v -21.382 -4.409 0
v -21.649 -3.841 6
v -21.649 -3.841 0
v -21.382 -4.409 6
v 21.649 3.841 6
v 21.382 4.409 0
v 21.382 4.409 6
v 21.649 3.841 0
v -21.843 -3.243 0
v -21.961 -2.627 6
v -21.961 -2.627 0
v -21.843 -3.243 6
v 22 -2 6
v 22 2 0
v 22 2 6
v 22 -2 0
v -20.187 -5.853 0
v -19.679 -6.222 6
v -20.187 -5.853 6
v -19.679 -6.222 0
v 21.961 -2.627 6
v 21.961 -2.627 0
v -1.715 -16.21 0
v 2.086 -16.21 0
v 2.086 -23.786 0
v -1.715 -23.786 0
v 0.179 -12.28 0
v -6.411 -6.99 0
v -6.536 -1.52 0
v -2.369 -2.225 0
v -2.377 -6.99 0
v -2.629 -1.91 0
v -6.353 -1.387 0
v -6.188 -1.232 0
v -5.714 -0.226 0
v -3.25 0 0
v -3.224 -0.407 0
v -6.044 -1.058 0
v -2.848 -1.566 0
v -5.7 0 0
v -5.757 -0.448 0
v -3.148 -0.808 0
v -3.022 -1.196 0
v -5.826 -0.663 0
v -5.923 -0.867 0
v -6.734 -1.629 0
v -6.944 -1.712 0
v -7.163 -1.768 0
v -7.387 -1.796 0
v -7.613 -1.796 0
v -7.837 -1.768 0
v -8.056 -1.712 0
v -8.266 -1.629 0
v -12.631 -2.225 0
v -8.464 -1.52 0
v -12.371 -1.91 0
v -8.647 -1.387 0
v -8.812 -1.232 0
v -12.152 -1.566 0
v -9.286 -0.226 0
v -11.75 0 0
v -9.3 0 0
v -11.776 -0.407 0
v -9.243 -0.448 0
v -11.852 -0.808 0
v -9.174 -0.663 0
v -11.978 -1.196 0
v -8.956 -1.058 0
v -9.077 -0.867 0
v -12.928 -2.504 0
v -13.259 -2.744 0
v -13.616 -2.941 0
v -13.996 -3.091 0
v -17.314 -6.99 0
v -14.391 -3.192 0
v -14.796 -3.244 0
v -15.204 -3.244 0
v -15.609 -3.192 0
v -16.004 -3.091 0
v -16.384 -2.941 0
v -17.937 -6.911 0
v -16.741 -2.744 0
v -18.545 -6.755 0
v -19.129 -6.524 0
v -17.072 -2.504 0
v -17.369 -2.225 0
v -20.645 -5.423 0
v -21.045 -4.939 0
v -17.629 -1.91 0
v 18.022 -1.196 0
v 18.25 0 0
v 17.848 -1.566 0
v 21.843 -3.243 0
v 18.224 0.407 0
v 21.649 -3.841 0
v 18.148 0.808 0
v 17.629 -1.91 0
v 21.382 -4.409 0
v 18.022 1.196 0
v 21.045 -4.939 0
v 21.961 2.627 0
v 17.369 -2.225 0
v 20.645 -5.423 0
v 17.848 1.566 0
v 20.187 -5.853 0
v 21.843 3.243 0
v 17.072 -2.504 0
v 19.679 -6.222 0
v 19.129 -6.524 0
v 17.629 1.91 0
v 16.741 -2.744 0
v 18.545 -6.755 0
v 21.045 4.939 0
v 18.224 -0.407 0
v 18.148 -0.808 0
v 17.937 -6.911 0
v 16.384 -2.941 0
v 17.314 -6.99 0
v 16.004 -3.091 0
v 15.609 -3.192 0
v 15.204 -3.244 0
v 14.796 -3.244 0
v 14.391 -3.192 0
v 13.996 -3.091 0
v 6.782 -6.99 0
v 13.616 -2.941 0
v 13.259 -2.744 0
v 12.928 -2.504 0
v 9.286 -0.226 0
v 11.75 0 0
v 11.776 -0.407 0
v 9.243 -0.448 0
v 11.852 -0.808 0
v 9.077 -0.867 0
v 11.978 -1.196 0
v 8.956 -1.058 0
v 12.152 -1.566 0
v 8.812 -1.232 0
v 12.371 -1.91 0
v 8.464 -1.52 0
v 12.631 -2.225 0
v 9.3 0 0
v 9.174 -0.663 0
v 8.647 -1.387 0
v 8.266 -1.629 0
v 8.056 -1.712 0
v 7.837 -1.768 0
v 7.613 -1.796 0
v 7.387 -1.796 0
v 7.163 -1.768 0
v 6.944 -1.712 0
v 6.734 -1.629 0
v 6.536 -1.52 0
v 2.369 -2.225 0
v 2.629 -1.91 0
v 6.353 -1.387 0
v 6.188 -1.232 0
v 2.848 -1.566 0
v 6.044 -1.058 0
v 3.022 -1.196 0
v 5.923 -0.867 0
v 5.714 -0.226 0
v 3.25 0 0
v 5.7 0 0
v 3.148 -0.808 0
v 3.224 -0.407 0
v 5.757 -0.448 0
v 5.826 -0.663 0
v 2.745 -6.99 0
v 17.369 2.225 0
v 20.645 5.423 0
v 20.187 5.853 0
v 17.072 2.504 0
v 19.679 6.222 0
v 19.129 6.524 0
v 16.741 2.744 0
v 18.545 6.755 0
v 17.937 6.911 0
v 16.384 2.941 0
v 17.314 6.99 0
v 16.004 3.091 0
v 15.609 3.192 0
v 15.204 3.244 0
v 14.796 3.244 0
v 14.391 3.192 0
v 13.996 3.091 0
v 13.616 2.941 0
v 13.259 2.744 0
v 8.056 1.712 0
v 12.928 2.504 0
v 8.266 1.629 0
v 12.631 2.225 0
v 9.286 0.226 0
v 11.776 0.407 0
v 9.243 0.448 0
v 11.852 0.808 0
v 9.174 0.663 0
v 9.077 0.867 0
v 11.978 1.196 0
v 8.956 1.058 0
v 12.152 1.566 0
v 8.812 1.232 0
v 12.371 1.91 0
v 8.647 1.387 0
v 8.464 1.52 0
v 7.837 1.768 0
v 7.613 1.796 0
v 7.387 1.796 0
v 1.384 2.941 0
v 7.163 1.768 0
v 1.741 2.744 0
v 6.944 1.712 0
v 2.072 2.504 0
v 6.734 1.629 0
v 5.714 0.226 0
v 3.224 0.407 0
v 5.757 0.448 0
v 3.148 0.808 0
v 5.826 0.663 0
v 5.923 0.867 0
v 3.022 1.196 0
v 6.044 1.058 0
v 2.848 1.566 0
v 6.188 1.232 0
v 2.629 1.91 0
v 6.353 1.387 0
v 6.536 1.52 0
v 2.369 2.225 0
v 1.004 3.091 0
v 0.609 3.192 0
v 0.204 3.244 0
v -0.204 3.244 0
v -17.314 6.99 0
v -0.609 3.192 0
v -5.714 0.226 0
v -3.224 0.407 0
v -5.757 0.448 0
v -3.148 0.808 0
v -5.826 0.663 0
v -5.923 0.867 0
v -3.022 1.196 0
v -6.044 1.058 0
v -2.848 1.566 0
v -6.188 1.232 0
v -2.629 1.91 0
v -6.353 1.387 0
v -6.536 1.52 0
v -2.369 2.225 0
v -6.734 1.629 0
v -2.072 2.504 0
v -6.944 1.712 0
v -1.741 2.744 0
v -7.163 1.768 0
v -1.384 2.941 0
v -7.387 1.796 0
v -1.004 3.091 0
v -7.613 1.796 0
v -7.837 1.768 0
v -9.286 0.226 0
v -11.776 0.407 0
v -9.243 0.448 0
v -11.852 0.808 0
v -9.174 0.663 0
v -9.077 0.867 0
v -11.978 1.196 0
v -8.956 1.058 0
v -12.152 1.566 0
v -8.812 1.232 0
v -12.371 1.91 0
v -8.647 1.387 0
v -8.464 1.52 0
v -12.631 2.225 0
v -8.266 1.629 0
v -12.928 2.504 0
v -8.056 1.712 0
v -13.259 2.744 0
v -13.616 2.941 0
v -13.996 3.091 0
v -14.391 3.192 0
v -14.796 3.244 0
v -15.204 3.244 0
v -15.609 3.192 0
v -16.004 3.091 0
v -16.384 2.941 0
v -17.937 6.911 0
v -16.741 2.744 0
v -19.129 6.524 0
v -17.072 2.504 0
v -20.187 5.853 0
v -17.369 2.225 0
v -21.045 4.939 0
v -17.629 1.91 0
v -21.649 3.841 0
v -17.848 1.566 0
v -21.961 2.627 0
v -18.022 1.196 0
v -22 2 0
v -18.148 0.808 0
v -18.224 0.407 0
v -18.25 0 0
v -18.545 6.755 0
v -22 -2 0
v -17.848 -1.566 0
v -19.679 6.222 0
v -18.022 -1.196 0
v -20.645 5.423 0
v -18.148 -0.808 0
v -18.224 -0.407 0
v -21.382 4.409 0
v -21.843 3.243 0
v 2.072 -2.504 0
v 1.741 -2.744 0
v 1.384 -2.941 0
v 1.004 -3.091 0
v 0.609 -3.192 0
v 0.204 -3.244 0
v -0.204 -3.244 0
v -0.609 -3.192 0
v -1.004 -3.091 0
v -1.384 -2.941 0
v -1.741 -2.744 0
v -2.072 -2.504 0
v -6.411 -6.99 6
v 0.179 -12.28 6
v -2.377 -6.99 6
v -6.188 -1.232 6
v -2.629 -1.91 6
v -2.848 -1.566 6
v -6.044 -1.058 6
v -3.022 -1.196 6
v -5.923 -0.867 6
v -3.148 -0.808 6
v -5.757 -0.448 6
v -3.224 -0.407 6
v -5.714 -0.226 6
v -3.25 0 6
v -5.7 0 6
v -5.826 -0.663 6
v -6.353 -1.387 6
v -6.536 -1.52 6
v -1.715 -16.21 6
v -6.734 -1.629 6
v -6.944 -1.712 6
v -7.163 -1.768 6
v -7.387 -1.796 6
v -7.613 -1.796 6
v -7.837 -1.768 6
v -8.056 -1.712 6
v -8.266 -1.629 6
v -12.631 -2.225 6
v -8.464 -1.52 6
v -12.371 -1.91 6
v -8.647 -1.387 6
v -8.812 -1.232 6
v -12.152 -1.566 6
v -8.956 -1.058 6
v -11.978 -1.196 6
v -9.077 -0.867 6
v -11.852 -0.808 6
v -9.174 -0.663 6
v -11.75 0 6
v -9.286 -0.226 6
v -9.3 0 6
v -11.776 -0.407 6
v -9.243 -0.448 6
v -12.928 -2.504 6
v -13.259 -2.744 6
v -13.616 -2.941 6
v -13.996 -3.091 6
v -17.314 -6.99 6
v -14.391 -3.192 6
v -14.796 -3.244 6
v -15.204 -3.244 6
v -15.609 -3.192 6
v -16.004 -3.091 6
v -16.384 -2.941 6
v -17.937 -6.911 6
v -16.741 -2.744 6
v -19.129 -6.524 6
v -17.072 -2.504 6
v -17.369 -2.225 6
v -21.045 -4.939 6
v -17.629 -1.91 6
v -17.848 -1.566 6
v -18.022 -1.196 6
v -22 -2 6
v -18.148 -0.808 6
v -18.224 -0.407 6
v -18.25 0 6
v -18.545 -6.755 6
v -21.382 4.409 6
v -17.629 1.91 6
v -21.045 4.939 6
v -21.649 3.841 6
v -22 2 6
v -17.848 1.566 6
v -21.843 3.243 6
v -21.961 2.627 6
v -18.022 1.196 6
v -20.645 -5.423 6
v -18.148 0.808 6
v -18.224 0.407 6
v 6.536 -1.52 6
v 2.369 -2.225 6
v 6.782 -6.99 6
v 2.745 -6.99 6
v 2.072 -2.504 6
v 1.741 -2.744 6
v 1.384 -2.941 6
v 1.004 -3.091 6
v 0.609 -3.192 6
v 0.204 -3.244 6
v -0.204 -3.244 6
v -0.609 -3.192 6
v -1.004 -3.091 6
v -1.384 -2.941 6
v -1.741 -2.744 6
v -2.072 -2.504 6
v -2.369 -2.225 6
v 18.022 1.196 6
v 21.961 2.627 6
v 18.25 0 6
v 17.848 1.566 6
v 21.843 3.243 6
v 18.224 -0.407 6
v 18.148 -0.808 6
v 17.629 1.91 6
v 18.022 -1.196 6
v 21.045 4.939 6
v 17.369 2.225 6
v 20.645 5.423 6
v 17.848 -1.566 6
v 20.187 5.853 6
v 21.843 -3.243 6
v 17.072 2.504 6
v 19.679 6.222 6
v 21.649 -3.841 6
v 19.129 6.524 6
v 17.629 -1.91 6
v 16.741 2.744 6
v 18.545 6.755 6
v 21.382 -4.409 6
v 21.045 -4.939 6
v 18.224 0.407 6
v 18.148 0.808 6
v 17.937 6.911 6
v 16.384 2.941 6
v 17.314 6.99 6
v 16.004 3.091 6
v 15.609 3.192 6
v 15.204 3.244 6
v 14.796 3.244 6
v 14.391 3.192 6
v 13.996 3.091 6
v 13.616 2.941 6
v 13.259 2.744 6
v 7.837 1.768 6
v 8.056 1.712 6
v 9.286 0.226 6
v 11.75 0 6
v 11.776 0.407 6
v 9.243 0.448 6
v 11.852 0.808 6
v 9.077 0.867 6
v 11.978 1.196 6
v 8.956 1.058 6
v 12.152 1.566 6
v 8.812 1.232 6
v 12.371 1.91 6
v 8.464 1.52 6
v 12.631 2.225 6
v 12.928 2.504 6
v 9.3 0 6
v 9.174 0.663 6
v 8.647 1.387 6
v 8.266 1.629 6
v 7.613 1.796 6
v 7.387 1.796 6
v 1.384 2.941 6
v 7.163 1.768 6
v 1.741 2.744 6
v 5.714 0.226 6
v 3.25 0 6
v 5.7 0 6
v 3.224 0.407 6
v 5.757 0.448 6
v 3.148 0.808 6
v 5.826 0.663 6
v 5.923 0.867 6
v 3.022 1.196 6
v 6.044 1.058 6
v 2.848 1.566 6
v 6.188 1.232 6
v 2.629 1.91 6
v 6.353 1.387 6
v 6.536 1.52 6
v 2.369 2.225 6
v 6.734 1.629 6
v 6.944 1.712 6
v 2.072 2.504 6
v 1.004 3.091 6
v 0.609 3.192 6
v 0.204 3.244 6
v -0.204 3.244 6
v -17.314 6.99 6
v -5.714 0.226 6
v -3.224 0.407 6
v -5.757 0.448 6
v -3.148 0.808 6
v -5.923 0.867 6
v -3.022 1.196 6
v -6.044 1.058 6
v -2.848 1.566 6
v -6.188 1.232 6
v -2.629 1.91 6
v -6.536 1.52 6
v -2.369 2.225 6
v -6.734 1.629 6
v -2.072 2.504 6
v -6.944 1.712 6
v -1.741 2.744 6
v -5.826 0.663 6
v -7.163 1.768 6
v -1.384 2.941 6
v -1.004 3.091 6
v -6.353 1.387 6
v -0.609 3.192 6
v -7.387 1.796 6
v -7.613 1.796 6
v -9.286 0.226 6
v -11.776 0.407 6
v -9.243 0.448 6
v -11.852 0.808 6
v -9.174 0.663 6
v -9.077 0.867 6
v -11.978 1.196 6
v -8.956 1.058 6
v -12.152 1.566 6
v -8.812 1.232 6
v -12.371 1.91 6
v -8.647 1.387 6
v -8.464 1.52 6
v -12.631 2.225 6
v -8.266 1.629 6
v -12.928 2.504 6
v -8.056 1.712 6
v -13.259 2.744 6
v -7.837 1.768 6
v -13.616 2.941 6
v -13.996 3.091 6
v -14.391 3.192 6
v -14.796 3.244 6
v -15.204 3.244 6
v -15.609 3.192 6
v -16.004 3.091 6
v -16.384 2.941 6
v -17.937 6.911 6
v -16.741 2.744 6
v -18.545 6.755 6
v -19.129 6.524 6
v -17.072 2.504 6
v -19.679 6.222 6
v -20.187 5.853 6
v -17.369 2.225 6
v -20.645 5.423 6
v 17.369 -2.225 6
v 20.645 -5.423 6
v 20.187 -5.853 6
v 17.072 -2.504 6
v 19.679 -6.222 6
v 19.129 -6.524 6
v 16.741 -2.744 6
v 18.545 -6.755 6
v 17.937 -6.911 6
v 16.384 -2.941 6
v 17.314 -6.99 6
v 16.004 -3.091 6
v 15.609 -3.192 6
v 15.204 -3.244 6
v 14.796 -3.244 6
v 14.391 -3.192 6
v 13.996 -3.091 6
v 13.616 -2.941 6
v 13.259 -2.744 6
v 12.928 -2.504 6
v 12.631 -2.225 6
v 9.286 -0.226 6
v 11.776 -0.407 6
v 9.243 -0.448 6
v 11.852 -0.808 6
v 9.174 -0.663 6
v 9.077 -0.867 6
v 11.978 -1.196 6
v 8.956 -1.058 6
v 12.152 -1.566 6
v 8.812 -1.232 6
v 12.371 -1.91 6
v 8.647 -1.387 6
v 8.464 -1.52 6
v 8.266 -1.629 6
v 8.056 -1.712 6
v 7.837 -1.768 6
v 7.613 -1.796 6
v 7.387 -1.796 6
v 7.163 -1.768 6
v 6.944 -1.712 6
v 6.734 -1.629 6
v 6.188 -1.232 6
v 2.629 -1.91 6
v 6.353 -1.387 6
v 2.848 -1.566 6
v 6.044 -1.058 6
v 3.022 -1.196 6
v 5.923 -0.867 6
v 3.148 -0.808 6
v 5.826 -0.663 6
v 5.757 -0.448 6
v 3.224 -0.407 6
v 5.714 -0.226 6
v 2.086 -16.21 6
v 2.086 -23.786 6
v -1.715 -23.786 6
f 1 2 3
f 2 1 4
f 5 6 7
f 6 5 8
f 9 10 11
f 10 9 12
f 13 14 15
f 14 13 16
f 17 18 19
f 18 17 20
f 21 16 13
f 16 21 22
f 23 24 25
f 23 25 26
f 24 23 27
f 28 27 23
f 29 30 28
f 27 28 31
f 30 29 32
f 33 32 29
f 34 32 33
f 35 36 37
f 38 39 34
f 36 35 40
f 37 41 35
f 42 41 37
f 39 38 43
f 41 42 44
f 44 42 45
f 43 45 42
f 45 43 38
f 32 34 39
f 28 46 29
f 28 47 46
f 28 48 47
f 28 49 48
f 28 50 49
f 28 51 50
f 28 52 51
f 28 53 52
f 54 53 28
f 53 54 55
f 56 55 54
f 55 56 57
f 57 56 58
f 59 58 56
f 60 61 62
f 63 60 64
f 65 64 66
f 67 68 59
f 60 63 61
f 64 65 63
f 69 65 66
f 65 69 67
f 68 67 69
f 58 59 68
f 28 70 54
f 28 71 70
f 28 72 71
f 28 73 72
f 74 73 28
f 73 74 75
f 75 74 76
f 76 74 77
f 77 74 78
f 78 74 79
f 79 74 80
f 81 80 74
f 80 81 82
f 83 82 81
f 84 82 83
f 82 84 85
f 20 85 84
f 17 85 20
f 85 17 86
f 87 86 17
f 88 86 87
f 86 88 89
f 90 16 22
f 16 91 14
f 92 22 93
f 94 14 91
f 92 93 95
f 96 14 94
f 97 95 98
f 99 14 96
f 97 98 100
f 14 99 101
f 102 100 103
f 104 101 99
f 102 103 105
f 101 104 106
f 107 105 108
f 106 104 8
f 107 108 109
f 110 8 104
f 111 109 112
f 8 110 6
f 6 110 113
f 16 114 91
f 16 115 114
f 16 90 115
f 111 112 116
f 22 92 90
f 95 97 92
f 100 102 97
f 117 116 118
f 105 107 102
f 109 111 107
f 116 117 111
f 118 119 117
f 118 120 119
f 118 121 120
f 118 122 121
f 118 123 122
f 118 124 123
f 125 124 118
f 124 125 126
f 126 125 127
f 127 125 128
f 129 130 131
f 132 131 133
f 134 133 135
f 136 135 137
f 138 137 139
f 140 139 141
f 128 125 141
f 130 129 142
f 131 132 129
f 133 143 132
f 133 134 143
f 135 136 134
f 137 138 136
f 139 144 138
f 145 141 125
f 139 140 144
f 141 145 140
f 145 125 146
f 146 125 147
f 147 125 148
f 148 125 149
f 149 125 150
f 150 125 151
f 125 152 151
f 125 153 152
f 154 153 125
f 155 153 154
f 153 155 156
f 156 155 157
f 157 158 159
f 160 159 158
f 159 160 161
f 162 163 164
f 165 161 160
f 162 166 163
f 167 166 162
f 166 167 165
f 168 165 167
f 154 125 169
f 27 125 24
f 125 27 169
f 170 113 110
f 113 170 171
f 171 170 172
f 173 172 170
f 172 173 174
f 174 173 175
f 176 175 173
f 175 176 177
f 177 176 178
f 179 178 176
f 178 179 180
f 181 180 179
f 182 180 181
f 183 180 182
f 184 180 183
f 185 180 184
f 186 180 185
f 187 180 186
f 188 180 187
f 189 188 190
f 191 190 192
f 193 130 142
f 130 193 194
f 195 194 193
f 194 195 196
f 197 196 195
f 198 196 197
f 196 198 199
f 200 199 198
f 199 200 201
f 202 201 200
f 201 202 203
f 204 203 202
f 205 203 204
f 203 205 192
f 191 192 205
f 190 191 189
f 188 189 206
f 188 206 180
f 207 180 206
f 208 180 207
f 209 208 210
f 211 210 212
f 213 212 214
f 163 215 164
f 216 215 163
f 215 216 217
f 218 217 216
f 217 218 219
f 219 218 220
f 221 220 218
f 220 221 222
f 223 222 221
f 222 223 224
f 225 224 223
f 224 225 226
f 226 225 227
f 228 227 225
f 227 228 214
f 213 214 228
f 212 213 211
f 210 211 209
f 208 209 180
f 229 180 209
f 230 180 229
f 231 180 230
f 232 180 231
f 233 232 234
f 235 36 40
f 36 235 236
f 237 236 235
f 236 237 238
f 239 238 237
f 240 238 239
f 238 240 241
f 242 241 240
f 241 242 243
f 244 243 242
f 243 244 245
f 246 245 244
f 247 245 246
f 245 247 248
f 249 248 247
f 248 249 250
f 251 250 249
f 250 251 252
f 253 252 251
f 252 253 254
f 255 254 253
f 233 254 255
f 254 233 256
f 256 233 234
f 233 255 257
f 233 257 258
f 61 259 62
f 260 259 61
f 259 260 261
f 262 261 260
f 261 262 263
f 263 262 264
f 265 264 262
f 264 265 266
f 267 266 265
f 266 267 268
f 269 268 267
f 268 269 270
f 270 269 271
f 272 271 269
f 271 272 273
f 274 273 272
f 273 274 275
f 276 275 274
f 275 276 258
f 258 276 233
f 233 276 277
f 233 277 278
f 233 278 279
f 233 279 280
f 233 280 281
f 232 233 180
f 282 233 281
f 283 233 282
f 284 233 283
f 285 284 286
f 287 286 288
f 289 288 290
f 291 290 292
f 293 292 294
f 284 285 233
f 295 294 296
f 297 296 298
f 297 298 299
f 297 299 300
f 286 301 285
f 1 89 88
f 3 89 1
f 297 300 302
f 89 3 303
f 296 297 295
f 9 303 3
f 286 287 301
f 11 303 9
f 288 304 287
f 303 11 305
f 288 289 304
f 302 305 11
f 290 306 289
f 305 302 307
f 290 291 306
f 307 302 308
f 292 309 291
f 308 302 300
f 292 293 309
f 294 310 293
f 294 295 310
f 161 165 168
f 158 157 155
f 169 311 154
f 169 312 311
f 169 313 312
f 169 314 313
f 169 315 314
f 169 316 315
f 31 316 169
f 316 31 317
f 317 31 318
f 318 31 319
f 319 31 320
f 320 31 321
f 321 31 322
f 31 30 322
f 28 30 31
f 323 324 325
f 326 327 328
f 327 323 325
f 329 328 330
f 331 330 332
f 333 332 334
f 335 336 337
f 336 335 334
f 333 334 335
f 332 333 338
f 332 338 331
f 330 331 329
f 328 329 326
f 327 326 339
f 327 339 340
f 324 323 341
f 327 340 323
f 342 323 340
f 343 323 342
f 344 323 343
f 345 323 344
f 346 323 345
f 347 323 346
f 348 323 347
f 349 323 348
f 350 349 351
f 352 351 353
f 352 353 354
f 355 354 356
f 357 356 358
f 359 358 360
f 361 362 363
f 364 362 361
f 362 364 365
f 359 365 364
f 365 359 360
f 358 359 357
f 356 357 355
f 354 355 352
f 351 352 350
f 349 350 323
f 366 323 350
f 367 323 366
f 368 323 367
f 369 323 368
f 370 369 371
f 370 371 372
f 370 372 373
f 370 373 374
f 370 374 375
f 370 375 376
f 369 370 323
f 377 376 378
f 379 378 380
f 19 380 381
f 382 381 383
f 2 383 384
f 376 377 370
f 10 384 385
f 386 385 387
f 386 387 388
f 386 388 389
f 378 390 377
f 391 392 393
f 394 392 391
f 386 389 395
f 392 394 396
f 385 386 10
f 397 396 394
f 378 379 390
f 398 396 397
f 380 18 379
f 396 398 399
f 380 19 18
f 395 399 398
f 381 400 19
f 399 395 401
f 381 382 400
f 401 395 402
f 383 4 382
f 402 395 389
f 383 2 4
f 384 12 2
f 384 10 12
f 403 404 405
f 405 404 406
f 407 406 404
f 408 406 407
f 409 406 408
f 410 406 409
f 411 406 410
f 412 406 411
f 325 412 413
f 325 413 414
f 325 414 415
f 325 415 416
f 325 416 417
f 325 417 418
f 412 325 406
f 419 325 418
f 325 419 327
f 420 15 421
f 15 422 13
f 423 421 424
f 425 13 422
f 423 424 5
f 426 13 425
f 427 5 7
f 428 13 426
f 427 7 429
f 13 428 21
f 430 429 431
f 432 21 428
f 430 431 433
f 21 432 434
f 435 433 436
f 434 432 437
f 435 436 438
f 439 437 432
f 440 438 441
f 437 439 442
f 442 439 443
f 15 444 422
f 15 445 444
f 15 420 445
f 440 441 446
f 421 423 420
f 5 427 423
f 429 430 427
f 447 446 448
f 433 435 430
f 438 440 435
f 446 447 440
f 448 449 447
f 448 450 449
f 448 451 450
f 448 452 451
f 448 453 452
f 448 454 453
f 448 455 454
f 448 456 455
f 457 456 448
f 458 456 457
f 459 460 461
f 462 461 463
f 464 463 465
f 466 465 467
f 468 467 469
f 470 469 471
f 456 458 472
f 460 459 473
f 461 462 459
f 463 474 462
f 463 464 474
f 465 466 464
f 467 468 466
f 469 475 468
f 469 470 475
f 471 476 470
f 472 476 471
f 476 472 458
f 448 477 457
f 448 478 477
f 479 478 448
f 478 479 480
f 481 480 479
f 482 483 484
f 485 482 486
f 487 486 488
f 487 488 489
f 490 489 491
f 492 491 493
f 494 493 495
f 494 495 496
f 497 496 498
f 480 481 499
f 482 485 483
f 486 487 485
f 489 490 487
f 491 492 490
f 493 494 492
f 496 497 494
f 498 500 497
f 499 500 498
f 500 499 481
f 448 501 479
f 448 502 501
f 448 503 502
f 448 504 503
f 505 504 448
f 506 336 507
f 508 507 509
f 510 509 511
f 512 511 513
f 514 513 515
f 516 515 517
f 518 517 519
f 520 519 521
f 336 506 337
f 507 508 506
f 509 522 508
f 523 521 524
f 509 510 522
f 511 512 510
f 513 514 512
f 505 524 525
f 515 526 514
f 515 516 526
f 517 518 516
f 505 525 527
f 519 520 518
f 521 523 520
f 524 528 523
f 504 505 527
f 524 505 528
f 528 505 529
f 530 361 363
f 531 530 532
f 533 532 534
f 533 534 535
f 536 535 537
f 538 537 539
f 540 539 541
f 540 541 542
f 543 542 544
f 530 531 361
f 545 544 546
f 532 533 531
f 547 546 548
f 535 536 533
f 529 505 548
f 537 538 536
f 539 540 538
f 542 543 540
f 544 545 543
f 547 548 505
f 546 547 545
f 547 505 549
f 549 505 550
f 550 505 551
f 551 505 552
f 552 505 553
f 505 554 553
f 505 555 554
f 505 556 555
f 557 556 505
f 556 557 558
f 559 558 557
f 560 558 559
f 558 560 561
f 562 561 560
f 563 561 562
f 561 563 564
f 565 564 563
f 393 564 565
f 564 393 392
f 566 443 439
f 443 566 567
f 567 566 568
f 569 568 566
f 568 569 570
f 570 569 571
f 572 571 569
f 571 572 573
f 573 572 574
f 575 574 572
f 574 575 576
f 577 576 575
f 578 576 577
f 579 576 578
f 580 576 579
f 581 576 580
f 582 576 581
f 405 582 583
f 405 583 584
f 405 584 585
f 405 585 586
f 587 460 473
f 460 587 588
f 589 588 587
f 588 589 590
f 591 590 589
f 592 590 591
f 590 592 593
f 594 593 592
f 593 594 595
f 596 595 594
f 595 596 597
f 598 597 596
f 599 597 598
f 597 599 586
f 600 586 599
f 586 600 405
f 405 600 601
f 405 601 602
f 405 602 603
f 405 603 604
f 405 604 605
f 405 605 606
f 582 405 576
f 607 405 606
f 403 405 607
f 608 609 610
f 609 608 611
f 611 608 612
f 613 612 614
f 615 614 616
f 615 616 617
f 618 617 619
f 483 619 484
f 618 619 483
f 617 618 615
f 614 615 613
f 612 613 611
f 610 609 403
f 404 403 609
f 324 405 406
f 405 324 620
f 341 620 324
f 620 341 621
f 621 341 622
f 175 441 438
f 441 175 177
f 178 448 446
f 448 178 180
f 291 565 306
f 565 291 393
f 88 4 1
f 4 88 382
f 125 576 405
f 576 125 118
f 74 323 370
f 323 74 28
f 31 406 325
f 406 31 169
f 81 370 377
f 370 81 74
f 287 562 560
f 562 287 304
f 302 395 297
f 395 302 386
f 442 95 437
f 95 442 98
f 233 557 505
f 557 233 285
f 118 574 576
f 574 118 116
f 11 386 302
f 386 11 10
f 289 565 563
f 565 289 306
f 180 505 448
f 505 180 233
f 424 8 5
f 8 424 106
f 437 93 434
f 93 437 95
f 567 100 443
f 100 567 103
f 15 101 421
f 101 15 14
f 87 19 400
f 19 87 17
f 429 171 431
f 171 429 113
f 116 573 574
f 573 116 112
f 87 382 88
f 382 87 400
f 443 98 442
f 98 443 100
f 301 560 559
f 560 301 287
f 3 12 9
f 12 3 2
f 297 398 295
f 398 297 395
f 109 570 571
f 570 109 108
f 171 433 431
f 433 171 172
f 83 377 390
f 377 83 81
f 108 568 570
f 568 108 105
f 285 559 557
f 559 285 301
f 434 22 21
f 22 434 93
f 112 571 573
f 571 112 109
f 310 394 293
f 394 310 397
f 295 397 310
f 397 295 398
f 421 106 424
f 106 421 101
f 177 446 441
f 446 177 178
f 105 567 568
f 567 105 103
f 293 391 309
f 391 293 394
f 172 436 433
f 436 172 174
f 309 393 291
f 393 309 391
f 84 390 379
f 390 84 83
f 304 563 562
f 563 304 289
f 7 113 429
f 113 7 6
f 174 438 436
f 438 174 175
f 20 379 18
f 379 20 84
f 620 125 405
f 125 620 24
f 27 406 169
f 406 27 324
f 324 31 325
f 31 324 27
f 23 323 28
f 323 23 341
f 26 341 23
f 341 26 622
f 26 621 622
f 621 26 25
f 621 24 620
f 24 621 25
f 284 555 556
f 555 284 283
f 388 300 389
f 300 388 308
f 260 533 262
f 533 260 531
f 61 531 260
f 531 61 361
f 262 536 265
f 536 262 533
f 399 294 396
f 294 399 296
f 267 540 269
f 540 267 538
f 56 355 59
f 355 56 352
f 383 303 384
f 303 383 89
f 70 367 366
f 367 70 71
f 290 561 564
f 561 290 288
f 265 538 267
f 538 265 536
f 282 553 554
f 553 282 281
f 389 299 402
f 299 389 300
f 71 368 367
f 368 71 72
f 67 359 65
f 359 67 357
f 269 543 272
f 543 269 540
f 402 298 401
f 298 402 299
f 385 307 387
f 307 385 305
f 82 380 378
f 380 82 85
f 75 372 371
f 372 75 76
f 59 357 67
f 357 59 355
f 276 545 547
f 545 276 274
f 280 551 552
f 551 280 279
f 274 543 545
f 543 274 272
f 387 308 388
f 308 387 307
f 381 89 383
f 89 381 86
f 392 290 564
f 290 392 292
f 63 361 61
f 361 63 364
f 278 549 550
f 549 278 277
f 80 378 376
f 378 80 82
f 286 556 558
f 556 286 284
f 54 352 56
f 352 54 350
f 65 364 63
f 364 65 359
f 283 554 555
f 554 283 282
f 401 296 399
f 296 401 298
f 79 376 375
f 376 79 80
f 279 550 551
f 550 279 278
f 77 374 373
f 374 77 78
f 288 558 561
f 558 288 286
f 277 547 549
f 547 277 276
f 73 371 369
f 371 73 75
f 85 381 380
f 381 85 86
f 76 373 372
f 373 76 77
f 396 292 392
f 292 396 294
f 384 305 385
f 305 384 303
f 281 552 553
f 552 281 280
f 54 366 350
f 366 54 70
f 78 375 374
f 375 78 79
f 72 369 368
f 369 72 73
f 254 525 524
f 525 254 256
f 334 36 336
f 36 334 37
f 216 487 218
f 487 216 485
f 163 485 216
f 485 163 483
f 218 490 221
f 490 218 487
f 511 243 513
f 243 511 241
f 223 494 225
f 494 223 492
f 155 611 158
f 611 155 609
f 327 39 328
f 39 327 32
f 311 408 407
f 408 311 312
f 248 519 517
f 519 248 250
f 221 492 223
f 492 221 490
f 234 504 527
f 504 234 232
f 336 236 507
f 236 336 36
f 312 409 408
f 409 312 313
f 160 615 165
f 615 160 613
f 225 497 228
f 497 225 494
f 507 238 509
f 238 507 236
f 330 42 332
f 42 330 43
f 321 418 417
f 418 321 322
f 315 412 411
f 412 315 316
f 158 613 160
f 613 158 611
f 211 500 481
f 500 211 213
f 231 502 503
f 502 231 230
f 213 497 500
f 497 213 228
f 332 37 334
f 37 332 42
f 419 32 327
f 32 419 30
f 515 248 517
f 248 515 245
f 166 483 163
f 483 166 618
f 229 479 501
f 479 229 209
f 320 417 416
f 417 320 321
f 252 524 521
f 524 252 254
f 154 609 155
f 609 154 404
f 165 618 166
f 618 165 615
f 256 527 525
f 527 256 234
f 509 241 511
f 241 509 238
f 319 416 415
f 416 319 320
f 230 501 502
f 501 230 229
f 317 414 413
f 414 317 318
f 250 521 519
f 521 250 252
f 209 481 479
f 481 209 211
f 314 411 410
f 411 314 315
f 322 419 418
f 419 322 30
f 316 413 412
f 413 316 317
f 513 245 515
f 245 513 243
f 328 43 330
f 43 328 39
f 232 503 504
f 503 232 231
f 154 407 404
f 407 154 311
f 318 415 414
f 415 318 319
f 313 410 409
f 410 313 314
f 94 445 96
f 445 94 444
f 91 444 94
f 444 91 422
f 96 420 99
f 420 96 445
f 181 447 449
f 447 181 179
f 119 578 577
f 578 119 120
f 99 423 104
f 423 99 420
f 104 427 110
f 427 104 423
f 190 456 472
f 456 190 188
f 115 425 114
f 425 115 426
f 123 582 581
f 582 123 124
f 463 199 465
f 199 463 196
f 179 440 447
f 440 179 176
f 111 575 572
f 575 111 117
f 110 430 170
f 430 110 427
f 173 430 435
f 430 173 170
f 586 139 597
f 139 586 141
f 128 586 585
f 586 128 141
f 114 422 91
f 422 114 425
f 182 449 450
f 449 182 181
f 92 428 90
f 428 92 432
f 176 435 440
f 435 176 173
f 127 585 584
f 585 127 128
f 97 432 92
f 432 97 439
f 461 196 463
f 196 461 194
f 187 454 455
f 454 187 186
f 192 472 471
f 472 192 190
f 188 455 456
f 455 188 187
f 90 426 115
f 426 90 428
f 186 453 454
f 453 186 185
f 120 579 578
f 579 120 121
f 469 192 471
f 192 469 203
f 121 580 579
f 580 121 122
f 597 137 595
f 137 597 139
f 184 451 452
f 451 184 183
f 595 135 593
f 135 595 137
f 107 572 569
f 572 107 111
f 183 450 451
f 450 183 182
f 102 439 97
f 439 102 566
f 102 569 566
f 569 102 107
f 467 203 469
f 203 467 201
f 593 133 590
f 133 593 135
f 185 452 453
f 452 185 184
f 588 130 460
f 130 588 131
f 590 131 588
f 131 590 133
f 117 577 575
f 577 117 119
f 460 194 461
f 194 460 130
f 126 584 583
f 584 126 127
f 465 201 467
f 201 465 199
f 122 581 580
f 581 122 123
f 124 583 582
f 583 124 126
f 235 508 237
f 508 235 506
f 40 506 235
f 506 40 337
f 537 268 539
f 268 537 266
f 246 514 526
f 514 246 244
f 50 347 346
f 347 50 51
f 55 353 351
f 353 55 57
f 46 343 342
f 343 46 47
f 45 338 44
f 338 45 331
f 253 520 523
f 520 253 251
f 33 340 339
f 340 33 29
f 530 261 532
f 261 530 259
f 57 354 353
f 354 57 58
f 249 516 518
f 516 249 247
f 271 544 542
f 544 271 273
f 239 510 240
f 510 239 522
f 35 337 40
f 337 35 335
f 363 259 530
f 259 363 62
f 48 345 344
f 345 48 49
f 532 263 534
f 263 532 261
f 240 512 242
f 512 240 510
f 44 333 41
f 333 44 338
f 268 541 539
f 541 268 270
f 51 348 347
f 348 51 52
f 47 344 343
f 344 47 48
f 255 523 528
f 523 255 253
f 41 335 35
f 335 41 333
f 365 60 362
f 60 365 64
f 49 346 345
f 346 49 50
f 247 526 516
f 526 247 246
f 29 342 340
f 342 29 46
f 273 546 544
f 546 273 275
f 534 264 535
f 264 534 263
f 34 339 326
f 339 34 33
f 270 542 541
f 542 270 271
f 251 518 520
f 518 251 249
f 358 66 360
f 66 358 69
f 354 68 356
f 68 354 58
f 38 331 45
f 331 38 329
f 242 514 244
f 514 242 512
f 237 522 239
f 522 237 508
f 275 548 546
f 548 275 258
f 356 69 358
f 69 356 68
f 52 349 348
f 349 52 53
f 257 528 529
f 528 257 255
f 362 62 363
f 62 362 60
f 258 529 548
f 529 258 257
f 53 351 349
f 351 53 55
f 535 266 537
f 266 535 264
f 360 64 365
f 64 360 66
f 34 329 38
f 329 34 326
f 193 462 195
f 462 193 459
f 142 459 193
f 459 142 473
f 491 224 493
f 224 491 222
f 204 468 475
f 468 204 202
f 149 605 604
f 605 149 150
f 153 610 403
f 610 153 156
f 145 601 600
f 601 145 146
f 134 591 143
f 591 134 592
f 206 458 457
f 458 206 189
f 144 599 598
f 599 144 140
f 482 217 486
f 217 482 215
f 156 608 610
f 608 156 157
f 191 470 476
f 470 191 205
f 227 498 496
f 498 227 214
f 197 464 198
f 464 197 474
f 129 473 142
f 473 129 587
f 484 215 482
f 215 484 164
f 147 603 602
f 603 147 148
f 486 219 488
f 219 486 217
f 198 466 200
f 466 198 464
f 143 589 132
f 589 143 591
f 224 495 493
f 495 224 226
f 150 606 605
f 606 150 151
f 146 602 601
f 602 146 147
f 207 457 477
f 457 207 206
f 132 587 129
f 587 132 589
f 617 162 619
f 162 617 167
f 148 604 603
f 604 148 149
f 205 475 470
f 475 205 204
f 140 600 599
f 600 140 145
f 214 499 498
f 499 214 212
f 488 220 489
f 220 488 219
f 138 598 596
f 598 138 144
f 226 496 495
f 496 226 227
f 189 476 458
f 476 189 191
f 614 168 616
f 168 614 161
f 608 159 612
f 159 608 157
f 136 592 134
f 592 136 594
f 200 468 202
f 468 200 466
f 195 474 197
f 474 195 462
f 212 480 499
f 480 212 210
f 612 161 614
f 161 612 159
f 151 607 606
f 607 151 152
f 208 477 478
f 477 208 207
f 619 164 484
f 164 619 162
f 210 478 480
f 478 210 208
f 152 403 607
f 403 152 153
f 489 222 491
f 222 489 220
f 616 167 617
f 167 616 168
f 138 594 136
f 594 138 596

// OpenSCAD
$fn = 50;


difference() {
	union() {
		hull() {
			translate(v = [-17.0000000000, 2.0000000000, 0]) {
				cylinder(h = 6, r = 5);
			}
			translate(v = [17.0000000000, 2.0000000000, 0]) {
				cylinder(h = 6, r = 5);
			}
			translate(v = [-17.0000000000, -2.0000000000, 0]) {
				cylinder(h = 6, r = 5);
			}
			translate(v = [17.0000000000, -2.0000000000, 0]) {
				cylinder(h = 6, r = 5);
			}
		}
		translate(v = [0, -5, 0]) {
			linear_extrude(height = 6) {
				text(font = "DejaVu Sans Mono:style=Bold", halign = "center", size = 19.0000000000, text = "Y", valign = "top");
			}
		}
	}
	union() {
		translate(v = [-15.0000000000, 0.0000000000, 0]) {
			translate(v = [0, 0, -100]) {
				cylinder(h = 200, r = 3.2500000000);
			}
		}
		translate(v = [0, 0, -100]) {
			cylinder(h = 200, r = 3.2500000000);
		}
		translate(v = [15.0000000000, 0.0000000000, 0]) {
			translate(v = [0, 0, -100]) {
				cylinder(h = 200, r = 3.2500000000);
			}
		}
		translate(v = [-15.0000000000, 0.0000000000, 0]) {
			translate(v = [0, 0, -100]) {
				cylinder(h = 200, r = 1.8000000000);
			}
		}
		translate(v = [-7.5000000000, 0.0000000000, 0]) {
			translate(v = [0, 0, -100]) {
				cylinder(h = 200, r = 1.8000000000);
			}
		}
		translate(v = [0, 0, -100]) {
			cylinder(h = 200, r = 1.8000000000);
		}
		translate(v = [7.5000000000, 0.0000000000, 0]) {
			translate(v = [0, 0, -100]) {
				cylinder(h = 200, r = 1.8000000000);
			}
		}
		translate(v = [15.0000000000, 0.0000000000, 0]) {
			translate(v = [0, 0, -100]) {
				cylinder(h = 200, r = 1.8000000000);
			}
		}
	}
}
